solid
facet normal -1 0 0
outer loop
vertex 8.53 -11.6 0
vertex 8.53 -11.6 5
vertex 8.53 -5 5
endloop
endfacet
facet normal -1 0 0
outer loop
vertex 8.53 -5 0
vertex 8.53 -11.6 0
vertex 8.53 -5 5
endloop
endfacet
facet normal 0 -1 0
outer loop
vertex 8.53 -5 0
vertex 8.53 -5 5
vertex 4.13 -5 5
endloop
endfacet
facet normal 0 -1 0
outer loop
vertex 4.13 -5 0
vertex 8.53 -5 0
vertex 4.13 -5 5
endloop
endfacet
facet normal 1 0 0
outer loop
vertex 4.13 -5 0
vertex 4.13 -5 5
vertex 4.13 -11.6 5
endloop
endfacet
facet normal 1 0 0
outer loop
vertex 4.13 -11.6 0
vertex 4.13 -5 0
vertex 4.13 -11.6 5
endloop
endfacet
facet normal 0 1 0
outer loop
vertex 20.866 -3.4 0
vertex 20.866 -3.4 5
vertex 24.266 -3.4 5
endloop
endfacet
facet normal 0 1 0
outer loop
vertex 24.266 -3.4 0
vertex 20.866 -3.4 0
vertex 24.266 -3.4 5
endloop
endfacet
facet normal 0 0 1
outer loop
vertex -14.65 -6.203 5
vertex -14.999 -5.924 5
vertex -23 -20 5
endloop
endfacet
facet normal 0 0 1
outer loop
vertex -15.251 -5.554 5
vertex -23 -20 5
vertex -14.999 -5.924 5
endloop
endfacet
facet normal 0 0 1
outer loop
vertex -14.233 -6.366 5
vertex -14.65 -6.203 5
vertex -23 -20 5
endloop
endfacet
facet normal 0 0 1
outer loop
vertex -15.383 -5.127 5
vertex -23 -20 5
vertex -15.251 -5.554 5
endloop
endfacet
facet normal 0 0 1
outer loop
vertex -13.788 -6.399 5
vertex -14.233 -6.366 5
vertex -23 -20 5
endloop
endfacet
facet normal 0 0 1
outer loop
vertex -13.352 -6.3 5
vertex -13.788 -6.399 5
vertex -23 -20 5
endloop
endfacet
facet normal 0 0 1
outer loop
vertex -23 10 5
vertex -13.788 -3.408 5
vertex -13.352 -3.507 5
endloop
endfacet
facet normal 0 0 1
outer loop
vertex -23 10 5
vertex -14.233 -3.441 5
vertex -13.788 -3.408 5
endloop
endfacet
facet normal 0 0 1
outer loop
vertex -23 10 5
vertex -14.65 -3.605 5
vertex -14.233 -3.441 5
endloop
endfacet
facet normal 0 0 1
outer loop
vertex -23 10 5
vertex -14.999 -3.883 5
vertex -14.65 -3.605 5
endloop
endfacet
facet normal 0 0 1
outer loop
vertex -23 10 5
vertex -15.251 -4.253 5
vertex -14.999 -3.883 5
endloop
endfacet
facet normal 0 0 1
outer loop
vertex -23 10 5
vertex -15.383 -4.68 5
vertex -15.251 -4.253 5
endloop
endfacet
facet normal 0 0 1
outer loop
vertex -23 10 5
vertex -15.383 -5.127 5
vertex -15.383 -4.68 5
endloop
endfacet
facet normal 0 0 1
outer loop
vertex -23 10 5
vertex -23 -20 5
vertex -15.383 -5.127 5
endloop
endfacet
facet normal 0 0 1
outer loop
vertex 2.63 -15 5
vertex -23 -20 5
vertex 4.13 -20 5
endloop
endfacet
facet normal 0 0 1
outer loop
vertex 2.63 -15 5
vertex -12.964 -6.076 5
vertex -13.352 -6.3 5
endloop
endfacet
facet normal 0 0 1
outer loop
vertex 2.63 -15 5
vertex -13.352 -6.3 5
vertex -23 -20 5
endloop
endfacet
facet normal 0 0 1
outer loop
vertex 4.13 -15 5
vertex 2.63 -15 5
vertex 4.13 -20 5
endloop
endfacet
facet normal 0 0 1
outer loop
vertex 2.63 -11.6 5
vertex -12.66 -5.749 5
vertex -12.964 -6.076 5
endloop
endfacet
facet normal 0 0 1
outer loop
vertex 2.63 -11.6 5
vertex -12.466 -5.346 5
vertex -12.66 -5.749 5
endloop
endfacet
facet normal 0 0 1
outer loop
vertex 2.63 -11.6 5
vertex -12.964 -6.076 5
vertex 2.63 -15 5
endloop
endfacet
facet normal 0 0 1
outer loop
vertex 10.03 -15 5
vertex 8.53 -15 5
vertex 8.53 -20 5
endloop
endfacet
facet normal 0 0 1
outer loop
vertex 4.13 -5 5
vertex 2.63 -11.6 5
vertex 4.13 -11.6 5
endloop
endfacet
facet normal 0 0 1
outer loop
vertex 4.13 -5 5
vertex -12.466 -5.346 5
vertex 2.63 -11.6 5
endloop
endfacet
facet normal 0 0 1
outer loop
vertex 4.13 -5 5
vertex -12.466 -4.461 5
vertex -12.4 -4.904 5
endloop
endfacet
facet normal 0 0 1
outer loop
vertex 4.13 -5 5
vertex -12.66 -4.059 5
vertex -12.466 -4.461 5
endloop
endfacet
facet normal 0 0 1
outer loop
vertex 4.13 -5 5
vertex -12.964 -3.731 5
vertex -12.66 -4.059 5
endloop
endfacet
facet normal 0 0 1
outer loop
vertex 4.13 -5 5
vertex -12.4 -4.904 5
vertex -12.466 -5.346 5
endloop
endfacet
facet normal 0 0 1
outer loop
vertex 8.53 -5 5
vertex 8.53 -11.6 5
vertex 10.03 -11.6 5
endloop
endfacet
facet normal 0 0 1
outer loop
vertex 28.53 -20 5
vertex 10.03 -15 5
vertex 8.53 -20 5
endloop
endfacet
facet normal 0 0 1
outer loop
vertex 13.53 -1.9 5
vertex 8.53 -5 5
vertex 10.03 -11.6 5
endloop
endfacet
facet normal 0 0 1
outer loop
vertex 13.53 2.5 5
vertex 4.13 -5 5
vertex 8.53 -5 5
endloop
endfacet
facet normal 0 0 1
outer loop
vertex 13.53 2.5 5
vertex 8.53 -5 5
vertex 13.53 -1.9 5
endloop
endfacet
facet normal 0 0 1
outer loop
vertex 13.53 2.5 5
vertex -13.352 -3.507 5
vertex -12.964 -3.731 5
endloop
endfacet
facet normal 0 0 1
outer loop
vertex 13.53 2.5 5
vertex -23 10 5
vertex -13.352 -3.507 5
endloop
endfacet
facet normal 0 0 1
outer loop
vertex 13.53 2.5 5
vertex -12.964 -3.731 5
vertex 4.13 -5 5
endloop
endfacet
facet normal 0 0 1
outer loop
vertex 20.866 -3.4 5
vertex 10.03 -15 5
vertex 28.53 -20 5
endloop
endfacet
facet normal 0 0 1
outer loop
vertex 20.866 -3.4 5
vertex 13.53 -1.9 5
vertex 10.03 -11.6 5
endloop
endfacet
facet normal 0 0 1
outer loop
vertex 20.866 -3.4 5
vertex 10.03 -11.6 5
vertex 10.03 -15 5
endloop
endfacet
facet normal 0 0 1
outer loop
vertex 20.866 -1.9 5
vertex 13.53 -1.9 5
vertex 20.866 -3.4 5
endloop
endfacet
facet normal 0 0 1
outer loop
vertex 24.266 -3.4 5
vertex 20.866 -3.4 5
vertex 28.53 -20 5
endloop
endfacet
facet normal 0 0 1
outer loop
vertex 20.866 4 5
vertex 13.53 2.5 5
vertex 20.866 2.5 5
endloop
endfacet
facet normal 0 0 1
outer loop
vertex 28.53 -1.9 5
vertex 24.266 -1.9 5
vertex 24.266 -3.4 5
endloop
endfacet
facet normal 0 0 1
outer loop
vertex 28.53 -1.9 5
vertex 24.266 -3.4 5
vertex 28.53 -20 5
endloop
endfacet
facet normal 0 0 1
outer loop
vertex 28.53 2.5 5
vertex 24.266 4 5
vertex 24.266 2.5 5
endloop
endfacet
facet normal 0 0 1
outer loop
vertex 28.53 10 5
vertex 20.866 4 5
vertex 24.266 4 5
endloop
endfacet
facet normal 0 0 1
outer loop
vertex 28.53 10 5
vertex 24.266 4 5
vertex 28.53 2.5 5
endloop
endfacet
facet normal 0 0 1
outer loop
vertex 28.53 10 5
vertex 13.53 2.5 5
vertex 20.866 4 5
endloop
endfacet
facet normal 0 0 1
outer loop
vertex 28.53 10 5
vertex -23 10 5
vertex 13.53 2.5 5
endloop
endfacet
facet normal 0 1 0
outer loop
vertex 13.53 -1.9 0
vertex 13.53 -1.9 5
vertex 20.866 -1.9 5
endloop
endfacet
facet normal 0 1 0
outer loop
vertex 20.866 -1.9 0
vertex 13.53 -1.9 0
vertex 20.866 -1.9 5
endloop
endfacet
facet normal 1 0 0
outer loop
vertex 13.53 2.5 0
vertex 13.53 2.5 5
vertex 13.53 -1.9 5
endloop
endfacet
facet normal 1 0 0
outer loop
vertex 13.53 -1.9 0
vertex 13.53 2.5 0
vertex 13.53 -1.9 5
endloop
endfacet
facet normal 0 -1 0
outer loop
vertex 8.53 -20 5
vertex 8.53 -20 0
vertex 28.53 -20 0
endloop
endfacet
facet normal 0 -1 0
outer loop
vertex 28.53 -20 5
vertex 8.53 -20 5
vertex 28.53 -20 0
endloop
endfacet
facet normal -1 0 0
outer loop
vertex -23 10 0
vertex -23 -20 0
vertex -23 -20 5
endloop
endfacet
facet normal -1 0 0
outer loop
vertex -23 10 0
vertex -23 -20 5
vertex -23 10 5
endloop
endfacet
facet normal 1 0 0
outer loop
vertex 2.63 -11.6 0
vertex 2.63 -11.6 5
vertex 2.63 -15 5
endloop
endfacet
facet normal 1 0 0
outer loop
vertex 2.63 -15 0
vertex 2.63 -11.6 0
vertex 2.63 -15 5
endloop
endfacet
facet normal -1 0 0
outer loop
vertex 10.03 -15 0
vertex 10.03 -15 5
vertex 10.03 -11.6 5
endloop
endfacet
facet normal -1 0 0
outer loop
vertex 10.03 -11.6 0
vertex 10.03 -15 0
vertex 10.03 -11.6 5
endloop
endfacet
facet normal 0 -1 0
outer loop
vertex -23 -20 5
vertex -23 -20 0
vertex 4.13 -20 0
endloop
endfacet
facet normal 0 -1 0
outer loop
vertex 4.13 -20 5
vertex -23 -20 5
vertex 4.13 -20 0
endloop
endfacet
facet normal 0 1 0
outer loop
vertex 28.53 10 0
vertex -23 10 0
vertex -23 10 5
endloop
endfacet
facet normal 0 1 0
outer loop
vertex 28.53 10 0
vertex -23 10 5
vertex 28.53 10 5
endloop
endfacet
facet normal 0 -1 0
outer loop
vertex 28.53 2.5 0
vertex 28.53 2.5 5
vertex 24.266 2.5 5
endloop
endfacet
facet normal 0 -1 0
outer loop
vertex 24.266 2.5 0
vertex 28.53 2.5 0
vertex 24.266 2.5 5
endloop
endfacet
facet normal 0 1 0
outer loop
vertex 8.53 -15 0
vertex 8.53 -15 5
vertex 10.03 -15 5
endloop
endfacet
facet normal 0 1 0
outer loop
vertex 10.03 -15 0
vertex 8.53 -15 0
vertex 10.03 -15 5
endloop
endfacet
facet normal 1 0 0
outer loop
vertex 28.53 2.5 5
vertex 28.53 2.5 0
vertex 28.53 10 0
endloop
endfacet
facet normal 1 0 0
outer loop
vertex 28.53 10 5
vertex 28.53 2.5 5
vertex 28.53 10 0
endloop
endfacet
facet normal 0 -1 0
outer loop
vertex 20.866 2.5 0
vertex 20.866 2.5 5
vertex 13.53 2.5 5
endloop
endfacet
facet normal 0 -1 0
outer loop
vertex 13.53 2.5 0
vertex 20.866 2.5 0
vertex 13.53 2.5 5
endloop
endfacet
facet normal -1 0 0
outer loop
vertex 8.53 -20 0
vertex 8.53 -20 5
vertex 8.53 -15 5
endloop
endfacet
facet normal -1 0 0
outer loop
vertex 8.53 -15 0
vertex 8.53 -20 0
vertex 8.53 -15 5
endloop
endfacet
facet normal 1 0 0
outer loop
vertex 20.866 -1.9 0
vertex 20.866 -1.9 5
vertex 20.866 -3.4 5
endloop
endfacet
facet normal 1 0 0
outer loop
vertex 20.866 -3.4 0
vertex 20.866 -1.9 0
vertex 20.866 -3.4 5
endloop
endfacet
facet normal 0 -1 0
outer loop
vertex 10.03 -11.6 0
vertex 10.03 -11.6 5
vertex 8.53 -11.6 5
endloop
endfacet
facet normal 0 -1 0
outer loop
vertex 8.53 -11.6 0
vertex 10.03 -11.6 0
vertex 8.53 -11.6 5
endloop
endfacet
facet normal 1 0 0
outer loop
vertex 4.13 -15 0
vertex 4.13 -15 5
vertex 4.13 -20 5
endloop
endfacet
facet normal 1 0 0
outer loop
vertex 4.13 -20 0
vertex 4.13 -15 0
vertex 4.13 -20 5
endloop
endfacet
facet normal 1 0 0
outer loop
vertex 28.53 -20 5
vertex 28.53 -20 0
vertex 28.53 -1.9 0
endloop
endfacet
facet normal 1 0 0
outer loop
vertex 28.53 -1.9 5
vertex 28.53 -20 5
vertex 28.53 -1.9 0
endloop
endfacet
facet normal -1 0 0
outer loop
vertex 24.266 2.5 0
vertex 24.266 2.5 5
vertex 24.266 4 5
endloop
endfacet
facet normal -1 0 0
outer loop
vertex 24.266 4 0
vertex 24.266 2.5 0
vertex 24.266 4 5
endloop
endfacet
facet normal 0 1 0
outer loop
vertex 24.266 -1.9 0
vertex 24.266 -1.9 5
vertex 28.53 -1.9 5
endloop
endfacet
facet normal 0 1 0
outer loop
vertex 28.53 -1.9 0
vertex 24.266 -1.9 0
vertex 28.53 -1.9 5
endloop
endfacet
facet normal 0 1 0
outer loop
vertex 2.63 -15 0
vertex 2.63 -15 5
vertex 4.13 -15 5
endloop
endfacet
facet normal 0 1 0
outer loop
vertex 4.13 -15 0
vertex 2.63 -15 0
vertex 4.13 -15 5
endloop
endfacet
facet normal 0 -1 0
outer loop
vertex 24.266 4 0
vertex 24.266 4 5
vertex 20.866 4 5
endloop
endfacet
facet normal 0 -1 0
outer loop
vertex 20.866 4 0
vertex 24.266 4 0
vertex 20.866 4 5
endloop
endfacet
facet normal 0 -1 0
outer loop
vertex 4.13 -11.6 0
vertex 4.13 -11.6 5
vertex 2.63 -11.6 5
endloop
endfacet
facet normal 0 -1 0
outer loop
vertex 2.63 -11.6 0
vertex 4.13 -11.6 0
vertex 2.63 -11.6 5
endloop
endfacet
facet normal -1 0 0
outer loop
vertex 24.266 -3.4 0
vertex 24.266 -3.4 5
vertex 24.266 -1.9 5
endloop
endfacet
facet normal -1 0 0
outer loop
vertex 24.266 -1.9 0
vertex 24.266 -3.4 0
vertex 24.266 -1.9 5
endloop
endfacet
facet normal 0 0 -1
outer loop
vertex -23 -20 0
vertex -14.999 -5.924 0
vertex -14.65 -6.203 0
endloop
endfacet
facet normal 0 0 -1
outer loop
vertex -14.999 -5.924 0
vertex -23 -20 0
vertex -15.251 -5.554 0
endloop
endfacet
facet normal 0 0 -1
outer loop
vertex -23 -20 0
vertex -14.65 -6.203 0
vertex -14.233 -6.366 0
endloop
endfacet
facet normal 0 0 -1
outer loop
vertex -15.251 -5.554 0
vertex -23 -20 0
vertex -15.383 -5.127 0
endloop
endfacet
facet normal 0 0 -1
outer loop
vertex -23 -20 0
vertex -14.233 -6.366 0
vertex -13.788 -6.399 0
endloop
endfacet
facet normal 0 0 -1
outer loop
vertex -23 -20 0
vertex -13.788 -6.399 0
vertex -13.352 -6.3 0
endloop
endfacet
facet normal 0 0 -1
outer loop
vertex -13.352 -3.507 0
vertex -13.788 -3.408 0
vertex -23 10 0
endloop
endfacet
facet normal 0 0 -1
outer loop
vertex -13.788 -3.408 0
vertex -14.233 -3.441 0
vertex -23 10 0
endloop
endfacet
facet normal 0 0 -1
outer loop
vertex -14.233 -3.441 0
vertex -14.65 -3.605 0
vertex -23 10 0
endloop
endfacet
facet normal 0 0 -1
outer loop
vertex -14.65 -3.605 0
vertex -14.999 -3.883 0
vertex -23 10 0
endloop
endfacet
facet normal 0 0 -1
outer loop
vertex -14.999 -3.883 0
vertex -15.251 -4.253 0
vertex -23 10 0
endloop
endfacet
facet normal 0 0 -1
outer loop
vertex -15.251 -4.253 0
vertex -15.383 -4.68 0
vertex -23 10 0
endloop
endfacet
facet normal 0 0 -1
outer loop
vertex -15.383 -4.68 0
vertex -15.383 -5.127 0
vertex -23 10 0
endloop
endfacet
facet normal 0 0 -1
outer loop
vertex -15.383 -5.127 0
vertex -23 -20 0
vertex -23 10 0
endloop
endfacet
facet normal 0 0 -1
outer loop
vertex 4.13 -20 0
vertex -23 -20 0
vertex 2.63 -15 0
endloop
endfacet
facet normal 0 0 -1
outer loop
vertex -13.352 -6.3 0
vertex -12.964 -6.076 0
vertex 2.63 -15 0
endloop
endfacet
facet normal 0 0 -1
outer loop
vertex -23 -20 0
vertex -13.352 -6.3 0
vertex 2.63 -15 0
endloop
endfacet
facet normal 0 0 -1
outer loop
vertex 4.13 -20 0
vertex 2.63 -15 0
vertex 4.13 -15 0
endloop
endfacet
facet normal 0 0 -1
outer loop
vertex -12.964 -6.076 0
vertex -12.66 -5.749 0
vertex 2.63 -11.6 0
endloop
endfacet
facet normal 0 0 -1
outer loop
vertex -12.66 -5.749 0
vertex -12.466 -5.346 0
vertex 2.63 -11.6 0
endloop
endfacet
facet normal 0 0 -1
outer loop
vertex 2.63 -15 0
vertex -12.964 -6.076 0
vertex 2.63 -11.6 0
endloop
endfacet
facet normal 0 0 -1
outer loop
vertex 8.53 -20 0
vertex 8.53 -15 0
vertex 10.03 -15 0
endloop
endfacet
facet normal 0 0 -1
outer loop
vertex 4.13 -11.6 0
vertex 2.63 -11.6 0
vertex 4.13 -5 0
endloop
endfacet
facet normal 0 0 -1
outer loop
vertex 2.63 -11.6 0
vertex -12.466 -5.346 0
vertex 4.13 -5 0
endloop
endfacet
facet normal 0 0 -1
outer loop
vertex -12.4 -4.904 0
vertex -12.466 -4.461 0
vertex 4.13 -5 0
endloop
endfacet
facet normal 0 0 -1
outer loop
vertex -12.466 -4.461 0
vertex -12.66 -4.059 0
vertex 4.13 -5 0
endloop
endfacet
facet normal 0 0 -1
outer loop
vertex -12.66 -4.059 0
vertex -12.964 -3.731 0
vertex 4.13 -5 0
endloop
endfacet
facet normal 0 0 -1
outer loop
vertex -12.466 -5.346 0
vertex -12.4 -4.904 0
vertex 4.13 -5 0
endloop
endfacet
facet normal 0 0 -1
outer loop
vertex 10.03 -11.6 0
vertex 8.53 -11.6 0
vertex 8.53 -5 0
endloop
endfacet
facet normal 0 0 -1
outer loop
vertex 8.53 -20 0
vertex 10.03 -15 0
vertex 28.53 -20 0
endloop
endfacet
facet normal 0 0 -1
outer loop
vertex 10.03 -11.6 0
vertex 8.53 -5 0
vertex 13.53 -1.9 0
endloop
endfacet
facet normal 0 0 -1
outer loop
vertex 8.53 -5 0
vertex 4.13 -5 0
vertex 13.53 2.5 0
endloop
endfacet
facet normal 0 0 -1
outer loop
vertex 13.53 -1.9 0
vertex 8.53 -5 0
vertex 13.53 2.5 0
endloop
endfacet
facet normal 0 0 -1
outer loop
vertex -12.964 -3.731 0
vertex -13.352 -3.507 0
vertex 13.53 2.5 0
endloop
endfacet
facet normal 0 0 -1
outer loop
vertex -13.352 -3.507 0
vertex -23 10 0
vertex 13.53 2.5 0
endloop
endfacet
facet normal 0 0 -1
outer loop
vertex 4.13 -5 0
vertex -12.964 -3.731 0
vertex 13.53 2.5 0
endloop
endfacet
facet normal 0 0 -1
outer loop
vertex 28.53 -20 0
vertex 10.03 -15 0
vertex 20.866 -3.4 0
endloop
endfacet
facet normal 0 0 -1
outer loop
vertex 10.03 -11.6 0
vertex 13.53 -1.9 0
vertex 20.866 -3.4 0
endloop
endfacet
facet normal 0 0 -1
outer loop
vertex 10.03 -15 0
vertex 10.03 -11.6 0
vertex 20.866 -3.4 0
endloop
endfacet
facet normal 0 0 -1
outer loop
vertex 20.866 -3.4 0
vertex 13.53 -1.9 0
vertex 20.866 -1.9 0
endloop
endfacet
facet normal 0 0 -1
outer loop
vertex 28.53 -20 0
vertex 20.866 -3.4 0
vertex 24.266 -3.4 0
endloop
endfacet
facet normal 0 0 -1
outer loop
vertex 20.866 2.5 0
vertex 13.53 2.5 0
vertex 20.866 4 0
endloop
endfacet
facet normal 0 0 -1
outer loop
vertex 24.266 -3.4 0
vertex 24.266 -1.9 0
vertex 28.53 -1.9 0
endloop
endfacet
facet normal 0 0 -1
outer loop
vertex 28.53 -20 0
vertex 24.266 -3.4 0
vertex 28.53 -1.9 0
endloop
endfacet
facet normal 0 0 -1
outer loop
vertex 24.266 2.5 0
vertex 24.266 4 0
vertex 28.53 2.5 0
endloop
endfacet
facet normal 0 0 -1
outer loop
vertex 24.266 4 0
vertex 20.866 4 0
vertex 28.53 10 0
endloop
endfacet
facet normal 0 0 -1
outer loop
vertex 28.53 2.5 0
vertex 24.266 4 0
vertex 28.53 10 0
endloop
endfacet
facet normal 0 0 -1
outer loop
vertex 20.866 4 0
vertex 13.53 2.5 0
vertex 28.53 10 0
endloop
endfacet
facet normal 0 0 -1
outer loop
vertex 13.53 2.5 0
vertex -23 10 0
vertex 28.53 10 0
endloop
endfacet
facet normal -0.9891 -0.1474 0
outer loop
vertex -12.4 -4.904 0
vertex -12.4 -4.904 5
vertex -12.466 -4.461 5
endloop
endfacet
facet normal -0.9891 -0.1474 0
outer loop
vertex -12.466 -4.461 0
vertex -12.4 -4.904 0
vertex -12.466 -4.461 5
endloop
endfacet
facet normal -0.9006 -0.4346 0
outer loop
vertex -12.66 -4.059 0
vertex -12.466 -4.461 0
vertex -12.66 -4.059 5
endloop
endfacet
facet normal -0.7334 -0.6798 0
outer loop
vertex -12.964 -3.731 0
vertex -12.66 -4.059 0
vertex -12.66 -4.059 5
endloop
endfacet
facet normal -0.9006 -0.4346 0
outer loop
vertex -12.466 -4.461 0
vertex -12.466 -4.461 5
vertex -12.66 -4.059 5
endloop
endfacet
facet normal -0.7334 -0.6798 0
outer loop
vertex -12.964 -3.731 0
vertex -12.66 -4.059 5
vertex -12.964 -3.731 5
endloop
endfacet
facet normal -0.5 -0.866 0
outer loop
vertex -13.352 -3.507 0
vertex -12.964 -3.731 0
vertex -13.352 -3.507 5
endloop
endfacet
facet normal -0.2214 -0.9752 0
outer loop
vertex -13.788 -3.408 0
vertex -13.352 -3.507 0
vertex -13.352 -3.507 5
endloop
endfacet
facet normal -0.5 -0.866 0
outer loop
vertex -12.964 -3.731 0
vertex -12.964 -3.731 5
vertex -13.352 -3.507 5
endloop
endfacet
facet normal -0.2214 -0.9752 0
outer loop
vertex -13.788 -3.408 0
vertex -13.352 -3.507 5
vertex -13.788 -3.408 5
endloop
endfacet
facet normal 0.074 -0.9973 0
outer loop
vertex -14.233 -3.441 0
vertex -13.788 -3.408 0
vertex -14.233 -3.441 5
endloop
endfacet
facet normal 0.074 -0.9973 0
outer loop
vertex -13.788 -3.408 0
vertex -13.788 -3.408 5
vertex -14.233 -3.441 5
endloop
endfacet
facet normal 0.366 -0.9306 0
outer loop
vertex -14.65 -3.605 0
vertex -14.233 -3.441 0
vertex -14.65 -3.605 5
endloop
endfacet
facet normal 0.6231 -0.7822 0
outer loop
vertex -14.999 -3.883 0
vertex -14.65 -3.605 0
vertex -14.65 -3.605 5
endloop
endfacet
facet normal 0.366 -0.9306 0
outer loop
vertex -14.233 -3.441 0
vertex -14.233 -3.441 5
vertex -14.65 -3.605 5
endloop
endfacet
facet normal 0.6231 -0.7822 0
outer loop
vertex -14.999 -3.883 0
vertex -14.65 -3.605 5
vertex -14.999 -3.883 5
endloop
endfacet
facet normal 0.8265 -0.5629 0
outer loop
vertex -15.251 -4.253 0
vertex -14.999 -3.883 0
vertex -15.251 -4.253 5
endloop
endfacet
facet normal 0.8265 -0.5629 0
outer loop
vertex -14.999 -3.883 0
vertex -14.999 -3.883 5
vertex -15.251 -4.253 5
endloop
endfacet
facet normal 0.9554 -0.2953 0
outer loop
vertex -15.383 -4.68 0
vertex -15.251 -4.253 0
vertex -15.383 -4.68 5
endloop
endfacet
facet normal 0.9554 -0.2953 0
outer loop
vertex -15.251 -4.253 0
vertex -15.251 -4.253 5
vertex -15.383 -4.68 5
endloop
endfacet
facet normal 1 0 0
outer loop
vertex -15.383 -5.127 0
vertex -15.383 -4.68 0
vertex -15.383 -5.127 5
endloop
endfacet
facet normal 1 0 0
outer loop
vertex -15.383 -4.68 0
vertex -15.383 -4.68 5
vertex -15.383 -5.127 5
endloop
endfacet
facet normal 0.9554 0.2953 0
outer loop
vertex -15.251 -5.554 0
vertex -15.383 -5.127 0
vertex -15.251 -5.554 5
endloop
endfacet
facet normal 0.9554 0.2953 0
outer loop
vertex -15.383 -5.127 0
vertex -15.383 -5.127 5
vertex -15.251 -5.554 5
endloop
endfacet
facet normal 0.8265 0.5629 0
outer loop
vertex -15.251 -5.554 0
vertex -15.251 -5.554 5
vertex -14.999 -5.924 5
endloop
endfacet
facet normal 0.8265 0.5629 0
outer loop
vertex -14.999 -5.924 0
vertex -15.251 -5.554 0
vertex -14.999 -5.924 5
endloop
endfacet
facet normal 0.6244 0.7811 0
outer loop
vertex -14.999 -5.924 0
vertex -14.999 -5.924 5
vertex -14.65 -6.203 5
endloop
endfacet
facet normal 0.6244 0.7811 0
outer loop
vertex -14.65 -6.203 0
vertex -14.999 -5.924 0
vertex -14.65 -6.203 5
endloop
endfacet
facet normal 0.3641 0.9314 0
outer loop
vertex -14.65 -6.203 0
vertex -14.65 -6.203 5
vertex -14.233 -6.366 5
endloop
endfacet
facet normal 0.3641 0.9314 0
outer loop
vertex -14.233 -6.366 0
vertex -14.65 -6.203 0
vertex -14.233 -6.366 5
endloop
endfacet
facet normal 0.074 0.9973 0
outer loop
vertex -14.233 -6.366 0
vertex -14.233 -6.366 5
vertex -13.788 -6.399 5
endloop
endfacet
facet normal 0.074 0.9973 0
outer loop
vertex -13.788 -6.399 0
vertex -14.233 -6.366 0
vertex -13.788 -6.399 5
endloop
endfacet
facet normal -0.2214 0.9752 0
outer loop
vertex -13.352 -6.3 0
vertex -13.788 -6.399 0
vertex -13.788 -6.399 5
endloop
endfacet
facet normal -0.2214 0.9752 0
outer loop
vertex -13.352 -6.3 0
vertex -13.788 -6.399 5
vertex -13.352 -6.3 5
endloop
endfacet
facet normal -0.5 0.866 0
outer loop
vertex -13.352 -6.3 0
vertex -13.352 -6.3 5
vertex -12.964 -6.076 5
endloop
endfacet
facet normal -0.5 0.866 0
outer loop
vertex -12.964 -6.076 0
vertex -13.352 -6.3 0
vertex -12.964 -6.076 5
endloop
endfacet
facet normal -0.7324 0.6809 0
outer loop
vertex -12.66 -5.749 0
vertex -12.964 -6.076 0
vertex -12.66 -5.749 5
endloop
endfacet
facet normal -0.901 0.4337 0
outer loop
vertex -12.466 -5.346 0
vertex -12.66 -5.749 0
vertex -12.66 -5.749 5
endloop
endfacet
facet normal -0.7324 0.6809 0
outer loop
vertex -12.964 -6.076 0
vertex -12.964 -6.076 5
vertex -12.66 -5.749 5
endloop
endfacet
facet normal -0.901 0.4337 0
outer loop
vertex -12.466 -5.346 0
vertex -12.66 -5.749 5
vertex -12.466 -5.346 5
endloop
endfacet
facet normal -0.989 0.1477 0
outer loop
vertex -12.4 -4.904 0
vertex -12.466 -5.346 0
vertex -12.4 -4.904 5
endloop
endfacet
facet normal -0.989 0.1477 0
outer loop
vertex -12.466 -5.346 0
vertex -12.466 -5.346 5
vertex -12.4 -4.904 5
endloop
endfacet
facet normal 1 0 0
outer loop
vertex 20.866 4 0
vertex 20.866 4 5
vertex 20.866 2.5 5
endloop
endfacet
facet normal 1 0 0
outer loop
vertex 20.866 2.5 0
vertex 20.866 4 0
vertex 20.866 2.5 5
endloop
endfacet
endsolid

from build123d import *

# Parameters (mm, degrees)
SKETCH1_W           = 51.53
SKETCH1_H           = 30
BOSS_EXTRUDE1_DEPTH = 5
CUT_EXTRUDE1_DEPTH  = 5
SKETCH4_R           = 1.5
CUT_EXTRUDE3_DEPTH  = 5


with BuildPart() as part:
    # Sketch1 → Boss-Extrude1 (new body)
    with BuildSketch(Plane.XY):
        with Locations((2.765, -5)):
            Rectangle(SKETCH1_W, SKETCH1_H)
    extrude(amount=BOSS_EXTRUDE1_DEPTH)

    # Sketch2 → Cut-Extrude1 (cut)
    with BuildSketch(Plane.XY.offset(5)):
        Polygon((13.53, -1.9), (20.865904873, -1.9), (20.865904873, -3.4), (24.265904873, -3.4), (24.265904873, -1.9), (28.53, -1.9), (28.53, 2.5), (24.265904873, 2.5), (24.265904873, 4), (20.865904873, 4), (20.865904873, 2.5), (13.53, 2.5), align=None)
        Polygon((4.13, -5), (4.13, -11.6), (2.63, -11.6), (2.63, -15), (4.13, -15), (4.13, -20), (8.53, -20), (8.53, -15), (10.03, -15), (10.03, -11.6), (8.53, -11.6), (8.53, -5), align=None)
    extrude(amount=-CUT_EXTRUDE1_DEPTH, mode=Mode.SUBTRACT)

    # Sketch4 → Cut-Extrude3 (cut)
    with BuildSketch(Plane.XY.offset(5)):
        with Locations((-13.899616309, -4.903624059)):
            Circle(SKETCH4_R)
    extrude(amount=-CUT_EXTRUDE3_DEPTH, mode=Mode.SUBTRACT)


solid = part.part
